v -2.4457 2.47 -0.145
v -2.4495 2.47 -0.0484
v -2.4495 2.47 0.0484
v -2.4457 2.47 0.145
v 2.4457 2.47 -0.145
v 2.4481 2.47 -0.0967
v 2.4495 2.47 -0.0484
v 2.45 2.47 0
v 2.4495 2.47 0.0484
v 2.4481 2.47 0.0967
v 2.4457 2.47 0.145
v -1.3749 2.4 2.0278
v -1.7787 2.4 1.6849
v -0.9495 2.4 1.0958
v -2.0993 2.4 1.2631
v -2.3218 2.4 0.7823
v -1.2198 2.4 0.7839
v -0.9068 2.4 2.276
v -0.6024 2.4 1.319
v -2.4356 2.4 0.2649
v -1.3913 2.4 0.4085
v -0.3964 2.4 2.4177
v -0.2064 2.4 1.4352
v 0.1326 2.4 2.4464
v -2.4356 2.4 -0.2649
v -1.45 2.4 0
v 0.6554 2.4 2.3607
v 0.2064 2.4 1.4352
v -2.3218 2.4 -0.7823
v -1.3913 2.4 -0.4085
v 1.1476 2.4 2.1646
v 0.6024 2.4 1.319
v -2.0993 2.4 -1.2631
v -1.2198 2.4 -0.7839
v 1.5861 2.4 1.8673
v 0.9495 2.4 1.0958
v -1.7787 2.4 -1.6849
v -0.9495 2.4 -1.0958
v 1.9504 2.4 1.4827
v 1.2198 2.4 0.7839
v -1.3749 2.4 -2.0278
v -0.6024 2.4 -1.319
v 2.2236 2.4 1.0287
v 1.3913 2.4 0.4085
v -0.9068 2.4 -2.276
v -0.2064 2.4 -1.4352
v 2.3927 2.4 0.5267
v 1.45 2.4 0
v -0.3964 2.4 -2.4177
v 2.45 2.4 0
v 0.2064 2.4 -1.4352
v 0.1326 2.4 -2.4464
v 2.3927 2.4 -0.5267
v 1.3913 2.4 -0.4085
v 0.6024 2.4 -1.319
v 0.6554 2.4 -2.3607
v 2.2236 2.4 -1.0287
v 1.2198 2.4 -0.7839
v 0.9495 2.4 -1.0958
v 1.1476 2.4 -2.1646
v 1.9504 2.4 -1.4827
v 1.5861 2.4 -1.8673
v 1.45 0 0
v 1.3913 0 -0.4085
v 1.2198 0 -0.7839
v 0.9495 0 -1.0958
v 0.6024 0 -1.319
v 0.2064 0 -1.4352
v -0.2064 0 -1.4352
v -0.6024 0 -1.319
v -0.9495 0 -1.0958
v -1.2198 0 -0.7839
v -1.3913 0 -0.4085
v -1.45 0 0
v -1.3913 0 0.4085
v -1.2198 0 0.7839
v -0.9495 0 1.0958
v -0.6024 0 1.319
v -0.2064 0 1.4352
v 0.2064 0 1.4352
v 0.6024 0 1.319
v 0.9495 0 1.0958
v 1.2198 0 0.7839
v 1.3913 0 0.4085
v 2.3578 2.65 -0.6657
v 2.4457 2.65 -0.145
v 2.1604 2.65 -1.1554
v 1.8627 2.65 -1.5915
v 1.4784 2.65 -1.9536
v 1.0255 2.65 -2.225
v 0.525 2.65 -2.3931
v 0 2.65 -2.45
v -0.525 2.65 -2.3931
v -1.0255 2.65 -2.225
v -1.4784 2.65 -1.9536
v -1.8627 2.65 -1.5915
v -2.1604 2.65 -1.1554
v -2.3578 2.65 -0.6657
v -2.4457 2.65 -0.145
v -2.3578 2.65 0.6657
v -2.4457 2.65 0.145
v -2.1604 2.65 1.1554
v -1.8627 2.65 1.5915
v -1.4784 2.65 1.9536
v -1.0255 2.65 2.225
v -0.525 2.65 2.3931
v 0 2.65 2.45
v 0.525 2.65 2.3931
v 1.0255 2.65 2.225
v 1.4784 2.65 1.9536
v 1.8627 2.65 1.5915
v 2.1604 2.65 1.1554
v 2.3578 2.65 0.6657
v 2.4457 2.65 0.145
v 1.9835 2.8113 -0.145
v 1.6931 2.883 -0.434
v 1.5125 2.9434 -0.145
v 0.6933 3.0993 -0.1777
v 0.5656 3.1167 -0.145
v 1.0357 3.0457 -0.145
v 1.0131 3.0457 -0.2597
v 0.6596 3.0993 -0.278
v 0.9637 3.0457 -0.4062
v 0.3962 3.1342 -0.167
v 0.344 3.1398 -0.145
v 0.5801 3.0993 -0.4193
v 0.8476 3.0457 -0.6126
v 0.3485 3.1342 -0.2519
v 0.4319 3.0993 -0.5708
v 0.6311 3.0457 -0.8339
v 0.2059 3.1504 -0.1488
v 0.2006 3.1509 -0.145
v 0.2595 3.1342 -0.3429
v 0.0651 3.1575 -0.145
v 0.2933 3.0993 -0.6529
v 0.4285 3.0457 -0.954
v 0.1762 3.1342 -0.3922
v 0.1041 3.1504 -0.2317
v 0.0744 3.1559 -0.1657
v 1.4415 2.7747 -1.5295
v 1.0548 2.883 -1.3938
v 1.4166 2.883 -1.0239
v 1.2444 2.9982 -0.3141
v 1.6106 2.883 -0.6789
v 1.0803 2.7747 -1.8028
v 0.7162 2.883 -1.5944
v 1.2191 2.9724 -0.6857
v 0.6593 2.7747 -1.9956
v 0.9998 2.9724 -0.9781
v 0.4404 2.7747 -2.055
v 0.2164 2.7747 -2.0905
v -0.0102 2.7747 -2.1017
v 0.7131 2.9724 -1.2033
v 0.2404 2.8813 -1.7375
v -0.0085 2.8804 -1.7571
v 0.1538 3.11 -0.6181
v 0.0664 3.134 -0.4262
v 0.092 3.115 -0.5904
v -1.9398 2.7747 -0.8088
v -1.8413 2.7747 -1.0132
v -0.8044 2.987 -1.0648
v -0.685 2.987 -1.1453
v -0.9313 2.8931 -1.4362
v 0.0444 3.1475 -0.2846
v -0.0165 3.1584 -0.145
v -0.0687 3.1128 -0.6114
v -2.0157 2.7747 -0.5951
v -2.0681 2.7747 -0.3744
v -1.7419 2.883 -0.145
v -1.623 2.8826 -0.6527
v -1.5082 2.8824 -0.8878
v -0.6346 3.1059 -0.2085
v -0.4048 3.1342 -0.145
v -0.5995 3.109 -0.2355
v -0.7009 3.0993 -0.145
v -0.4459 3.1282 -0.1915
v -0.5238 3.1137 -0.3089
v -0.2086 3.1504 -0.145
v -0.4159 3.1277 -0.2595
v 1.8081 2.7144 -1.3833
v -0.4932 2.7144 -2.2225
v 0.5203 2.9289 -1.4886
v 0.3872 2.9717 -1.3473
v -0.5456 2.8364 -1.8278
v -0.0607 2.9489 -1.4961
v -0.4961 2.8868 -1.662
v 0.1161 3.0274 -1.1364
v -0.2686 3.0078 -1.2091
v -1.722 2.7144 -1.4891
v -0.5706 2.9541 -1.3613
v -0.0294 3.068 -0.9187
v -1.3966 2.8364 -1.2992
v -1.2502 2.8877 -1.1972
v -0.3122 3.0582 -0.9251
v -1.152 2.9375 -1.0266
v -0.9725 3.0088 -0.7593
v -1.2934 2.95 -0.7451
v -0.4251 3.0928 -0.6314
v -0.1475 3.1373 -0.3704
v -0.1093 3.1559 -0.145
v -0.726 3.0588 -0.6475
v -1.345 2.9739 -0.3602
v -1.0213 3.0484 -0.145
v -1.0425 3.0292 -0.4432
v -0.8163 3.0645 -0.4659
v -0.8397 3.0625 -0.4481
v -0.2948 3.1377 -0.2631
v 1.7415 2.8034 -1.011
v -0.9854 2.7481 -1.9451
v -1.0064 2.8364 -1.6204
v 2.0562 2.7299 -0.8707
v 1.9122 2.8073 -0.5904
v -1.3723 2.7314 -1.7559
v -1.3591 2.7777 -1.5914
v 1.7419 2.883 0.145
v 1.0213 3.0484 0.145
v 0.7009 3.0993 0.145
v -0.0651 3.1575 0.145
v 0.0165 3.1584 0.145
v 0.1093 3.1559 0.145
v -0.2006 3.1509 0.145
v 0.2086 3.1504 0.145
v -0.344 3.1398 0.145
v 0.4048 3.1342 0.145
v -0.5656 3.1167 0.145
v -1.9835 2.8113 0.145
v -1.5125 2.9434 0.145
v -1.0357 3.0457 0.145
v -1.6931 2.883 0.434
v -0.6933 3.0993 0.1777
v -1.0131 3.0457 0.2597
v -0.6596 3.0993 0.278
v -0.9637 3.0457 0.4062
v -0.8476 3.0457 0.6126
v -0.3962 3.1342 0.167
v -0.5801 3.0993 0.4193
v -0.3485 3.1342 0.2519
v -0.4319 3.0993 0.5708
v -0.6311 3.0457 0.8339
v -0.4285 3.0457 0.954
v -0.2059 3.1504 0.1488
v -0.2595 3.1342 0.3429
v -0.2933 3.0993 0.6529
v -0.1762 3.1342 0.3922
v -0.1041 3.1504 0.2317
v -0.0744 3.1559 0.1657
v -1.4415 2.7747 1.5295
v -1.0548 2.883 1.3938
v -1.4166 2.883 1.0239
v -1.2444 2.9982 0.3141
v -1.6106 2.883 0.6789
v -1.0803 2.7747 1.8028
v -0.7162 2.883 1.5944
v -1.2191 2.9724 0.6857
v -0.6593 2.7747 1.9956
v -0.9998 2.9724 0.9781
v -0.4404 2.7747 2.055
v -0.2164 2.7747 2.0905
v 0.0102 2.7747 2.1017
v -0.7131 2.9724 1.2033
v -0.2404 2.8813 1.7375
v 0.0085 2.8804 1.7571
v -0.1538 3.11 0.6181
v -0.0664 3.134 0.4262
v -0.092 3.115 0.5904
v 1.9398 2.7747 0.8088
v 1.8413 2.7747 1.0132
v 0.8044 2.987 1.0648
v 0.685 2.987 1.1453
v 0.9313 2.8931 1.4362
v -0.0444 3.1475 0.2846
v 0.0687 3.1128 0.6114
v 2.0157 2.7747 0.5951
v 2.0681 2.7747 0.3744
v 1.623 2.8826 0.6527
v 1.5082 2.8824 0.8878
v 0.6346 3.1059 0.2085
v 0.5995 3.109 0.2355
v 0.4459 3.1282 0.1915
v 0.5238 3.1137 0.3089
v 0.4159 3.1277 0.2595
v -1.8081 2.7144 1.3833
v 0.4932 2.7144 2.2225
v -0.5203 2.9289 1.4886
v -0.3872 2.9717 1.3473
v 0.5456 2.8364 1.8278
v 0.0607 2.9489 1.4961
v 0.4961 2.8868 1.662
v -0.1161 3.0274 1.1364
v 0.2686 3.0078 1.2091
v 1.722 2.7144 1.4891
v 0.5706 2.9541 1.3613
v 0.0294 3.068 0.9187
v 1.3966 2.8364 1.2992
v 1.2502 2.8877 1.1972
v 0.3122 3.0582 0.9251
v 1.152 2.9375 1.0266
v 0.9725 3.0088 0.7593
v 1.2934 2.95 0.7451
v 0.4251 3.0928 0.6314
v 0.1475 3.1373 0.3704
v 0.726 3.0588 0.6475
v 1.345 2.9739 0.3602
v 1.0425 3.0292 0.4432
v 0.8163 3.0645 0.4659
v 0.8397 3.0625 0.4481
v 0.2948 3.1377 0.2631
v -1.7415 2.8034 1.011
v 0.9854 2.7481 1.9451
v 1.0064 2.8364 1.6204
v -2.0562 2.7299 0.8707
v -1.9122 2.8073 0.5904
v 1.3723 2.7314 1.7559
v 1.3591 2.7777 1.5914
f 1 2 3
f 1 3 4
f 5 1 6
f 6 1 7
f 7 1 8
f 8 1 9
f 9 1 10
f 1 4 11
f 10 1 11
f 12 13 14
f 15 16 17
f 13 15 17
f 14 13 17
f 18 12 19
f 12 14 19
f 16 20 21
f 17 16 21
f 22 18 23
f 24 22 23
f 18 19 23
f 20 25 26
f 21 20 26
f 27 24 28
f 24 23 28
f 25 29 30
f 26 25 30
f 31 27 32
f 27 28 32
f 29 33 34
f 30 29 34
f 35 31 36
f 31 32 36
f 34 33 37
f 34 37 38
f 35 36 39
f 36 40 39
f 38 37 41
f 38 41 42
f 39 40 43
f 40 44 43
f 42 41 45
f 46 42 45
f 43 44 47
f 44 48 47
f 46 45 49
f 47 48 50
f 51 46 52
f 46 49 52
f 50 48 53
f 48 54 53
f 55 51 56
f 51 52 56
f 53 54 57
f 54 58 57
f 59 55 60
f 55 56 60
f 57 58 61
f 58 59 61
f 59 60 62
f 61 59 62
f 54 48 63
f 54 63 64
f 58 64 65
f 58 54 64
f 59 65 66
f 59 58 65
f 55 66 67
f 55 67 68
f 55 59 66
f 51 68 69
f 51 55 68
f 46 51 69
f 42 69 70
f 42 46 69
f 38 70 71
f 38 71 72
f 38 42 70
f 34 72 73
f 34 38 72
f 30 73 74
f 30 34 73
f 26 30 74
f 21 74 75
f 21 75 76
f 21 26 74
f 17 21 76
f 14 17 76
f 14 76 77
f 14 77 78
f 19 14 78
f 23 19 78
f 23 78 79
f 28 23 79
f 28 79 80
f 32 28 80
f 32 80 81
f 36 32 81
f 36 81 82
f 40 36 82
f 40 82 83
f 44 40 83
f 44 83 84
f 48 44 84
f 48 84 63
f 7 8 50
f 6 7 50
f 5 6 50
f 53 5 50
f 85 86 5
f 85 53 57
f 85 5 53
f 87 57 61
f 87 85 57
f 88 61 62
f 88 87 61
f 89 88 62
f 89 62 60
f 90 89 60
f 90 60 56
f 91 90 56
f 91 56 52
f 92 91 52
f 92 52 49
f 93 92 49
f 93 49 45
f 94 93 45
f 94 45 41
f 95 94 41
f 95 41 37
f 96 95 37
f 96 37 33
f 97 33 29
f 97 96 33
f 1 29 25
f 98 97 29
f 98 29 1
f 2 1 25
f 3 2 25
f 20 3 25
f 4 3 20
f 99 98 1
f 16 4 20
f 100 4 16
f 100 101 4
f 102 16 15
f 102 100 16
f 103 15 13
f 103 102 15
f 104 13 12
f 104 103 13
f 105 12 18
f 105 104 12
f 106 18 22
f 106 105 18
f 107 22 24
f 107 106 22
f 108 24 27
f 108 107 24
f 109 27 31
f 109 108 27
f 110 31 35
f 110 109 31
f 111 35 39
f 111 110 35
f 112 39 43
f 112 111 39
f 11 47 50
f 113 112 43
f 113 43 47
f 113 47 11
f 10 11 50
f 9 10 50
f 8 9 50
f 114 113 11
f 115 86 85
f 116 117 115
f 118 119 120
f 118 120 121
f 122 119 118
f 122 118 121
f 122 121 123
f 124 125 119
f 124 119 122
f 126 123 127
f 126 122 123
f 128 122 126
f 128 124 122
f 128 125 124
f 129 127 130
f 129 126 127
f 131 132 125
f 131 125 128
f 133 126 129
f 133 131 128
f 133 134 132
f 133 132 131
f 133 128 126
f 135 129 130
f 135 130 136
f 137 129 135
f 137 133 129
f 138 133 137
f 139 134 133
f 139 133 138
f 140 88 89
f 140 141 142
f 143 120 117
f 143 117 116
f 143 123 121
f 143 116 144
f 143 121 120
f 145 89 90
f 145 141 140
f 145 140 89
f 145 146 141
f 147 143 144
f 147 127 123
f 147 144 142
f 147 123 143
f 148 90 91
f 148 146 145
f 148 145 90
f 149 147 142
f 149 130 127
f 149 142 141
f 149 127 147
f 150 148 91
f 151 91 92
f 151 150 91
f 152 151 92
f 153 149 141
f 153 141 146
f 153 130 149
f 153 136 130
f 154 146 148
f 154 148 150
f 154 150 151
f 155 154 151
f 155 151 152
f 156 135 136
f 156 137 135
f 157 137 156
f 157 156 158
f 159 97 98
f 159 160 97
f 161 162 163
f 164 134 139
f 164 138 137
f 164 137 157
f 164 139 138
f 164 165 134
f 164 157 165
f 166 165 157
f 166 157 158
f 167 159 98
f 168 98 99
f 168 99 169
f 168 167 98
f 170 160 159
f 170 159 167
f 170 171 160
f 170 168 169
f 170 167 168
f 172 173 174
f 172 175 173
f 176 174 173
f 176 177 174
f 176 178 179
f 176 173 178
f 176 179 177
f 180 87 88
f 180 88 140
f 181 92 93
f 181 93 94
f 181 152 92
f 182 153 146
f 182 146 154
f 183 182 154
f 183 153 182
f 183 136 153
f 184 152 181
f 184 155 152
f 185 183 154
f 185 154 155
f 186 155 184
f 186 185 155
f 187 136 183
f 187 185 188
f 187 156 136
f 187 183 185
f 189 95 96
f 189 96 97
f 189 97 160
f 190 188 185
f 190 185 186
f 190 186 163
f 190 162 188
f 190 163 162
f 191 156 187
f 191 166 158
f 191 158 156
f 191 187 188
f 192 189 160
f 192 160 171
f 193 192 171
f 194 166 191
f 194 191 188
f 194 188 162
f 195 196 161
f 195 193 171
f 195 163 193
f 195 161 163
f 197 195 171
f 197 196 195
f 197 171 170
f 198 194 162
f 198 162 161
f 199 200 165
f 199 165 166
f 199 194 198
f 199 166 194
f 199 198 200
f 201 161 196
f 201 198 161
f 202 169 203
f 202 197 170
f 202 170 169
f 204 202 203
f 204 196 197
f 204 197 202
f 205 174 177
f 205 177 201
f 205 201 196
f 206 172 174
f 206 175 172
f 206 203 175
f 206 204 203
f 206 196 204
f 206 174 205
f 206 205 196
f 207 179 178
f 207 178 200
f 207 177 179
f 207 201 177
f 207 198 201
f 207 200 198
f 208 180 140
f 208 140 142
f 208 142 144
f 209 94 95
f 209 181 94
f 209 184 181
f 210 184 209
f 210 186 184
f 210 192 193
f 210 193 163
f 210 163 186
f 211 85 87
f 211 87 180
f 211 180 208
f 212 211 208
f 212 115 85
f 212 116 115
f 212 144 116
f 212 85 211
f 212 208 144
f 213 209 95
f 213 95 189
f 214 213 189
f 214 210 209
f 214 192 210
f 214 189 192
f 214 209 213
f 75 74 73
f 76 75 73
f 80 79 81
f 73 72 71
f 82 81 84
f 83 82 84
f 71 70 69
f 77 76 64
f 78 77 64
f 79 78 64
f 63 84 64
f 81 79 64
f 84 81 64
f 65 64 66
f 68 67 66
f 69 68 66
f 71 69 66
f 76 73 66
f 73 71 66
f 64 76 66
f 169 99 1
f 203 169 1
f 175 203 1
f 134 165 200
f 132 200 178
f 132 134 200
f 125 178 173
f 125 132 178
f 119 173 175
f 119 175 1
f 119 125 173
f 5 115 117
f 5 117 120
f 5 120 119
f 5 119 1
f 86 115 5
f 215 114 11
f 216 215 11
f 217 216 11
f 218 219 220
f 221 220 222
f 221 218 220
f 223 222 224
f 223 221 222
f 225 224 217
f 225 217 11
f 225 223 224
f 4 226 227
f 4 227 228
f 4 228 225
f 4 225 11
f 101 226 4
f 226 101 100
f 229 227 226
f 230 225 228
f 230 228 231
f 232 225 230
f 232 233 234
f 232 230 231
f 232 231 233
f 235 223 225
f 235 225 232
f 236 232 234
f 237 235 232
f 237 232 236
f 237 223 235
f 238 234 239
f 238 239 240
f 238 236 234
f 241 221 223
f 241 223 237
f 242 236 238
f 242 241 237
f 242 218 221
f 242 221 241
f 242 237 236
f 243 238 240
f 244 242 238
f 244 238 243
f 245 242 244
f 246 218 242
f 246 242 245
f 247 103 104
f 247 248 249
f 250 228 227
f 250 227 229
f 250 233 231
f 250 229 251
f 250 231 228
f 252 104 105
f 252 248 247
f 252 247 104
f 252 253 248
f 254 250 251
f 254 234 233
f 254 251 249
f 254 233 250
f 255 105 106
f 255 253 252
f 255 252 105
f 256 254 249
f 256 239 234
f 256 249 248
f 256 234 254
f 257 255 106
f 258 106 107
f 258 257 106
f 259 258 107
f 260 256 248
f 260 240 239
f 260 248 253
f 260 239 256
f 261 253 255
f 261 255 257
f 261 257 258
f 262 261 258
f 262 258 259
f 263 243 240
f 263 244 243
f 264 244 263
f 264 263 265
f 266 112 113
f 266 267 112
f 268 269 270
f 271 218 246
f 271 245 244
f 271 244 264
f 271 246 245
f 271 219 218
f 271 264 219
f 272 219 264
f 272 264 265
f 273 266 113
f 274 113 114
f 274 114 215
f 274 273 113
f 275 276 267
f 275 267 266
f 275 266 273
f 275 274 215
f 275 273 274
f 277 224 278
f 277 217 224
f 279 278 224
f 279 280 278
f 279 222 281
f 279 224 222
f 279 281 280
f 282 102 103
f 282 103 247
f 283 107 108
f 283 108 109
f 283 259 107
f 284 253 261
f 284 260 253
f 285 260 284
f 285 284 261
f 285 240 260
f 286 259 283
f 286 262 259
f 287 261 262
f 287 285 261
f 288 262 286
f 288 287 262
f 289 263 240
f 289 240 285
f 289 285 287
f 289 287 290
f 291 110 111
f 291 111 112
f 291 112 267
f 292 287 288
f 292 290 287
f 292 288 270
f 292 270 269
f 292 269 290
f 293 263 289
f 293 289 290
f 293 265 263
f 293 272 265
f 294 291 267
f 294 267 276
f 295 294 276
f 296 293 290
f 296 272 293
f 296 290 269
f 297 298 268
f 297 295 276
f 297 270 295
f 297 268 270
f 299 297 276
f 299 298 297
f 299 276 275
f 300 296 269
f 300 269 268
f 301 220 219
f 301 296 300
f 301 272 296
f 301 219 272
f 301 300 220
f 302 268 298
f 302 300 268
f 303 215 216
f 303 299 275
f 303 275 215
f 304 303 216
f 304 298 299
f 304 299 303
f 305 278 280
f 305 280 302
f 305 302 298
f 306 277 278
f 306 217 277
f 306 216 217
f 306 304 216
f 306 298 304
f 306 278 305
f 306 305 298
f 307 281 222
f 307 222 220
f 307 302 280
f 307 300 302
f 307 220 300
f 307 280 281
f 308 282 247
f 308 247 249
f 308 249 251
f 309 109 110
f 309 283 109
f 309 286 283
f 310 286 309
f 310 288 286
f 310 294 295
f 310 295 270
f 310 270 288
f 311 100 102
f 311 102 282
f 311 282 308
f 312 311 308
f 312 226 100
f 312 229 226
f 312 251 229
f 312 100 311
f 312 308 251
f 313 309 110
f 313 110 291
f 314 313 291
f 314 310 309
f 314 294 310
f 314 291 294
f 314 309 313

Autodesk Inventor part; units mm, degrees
ref_plane "YZ Plane" through (0, 0, 0) normal (1, 0, 0) x (0, 1, 0)
sketch "Esboço1" plane through (0, 0, 0) normal (0, 0, 1) x (1, 0, 0)
  line L0 (0, 0) -> (1.45, 0)
  line L1 (1.45, 0) -> (1.45, 2.4)
  line L2 (1.45, 2.4) -> (2.45, 2.4)
  line L3 (2.45, 2.4) -> (8.95, 2.4)
  line L4 (2.45, 2.4) -> (2.45, 2.65)
  line L5 (0, 0) -> (0, 3.1668)
  line L6 (1.45, 0) -> (0, 0)
  arc A0 (2.45, 2.65) -> (0, 3.1668) centre (-0.3817, -4.7083) ccw
  point P0 (0, 2.5981)
  dimension "d0" = 1.45
  dimension "d1" = 2.4
  dimension "d11" = 1
revolve "Revolução1" add sketch "Esboço1" angle 360 about axis through (0, 0, 0) along (0, 1, 0)
thread "Rosca1" size "M30x3.5" class "6g" standard "ANSI Metric M Profile" full length
ref_plane "Plano de trabalho1" through (0, 14.65, 0) normal (0, -1, 0) x (1, 0, 0)
sketch "Esboço2" plane through (0, 14.65, 0) normal (0, -1, 0) x (1, 0, 0)
  line L0 (23.8734, 2.4868) -> (-23.8734, 2.4868)
  line L1 (-23.8734, 2.4868) -> (-23.8734, -2.4868)
  line L2 (-23.8734, -2.4868) -> (23.8734, -2.4868)
  line L3 (23.8734, -2.4868) -> (23.8734, 2.4868)
  line L4 (23.8734, 2.4868) -> (-23.8734, -2.4868) construction
  line L5 (-23.8734, 2.4868) -> (23.8734, -2.4868) construction
  point P0 (0, 0)
extrude "Extrusão1" cut sketch "Esboço2" along normal blind 11
thread "Rosca2" size "M3x0.5" class "6g" standard "ANSI Metric M Profile" full length
ref_plane "Plano de trabalho2" through (0, 3.4, 0) normal (0, -1, 0) x (1, 0, 0)
sketch "Esboço3" plane through (0, 3.4, 0) normal (0, -1, 0) x (1, 0, 0)
  line L0 (-2.7014, -0.145) -> (2.7014, -0.145)
  line L1 (2.7014, -0.145) -> (2.7014, 0.145)
  line L2 (2.7014, 0.145) -> (-2.7014, 0.145)
  line L3 (-2.7014, 0.145) -> (-2.7014, -0.145)
  line L4 (-2.7014, -0.145) -> (2.7014, 0.145) construction
  line L5 (2.7014, -0.145) -> (-2.7014, 0.145) construction
  point P0 (0, 0)
extrude "Extrusão2" cut sketch "Esboço3" along normal blind 0.93
properties part number "prafuso3"
